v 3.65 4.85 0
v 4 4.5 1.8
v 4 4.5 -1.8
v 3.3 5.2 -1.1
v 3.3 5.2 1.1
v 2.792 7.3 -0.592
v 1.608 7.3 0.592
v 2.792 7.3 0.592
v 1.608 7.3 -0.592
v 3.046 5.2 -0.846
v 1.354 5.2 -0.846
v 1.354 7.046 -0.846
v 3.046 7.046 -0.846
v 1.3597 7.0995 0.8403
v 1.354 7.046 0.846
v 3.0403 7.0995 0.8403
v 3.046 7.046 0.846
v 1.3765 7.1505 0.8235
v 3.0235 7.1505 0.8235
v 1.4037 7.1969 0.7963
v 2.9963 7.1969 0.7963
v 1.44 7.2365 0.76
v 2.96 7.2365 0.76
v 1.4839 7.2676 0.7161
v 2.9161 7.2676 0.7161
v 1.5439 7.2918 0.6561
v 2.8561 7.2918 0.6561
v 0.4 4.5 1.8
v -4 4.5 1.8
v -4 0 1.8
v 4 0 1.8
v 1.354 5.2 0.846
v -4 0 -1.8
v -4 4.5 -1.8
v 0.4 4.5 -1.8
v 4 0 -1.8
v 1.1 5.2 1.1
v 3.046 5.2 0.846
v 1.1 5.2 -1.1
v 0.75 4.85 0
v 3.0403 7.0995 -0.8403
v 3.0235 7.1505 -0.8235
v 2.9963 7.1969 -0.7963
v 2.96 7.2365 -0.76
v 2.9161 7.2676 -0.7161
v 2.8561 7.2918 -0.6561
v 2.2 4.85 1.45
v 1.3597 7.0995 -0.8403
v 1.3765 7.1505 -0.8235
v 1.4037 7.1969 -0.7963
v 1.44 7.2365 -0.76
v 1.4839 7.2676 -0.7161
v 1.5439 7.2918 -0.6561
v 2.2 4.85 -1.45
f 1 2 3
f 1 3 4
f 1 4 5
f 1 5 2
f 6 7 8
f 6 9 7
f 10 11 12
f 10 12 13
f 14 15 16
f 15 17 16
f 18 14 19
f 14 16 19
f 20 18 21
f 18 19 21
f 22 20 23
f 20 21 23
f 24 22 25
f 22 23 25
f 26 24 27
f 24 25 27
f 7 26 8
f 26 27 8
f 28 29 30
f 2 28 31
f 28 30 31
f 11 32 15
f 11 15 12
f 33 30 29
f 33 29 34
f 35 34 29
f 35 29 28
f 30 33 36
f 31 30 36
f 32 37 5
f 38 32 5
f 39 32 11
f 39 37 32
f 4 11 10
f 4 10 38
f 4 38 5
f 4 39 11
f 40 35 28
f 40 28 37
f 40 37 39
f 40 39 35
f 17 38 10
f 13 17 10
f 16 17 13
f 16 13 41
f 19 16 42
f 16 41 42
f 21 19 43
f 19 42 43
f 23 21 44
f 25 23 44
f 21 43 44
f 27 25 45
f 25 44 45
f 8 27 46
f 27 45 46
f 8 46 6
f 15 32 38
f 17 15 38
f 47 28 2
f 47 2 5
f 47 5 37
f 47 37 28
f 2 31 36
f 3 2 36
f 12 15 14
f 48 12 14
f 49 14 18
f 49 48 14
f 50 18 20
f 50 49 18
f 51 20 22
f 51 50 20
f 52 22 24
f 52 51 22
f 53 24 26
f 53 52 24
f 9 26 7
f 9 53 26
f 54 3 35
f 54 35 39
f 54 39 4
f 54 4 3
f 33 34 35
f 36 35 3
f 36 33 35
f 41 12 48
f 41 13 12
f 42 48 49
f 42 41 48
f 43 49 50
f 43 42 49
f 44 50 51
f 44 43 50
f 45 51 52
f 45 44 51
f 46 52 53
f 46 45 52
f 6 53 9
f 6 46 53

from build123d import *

# Parameters (mm, degrees)
SKETCH1_W           = 8
SKETCH1_H           = 3.6
BOSS_EXTRUDE1_DEPTH = 4.5
SKETCH2_W           = 3.6
SKETCH2_H           = 3.6
BOSS_EXTRUDE2_DEPTH = 0.7
BOSS_EXTRUDE2_TAPER = 45
SKETCH3_W           = 1.692
SKETCH3_H           = 1.692
BOSS_EXTRUDE3_DEPTH = 2.1
FILLET1_R           = 0.254


with BuildPart() as part:
    # Sketch1 → Boss-Extrude1 (new body)
    with BuildSketch(Plane(origin=(0, 0, 0), x_dir=(1, 0, 0), z_dir=(0, 1, 0))):
        Rectangle(SKETCH1_W, SKETCH1_H)
    extrude(amount=BOSS_EXTRUDE1_DEPTH)

    # Sketch2 → Boss-Extrude2 (add)
    with BuildSketch(Plane(origin=(0, 4.5, 0), x_dir=(1, 0, 0), z_dir=(0, 1, 0))):
        with Locations((2.2, 0)):
            Rectangle(SKETCH2_W, SKETCH2_H)
    extrude(amount=BOSS_EXTRUDE2_DEPTH, taper=BOSS_EXTRUDE2_TAPER)

    # Sketch3 → Boss-Extrude3 (add)
    with BuildSketch(Plane(origin=(0, 5.2, 0), x_dir=(1, 0, 0), z_dir=(0, 1, 0))):
        with Locations((2.2, 0)):
            Rectangle(SKETCH3_W, SKETCH3_H)
    extrude(amount=BOSS_EXTRUDE3_DEPTH)

    # Fillet1
    fillet1_edges = [part.edges().sort_by_distance(p)[0] for p in [
        (2.2, 7.3, 0.846),
        (3.046, 7.3, 0),
        (2.2, 7.3, -0.846),
        (1.354, 7.3, 0),
    ]]
    fillet(fillet1_edges, radius=FILLET1_R)


solid = part.part
